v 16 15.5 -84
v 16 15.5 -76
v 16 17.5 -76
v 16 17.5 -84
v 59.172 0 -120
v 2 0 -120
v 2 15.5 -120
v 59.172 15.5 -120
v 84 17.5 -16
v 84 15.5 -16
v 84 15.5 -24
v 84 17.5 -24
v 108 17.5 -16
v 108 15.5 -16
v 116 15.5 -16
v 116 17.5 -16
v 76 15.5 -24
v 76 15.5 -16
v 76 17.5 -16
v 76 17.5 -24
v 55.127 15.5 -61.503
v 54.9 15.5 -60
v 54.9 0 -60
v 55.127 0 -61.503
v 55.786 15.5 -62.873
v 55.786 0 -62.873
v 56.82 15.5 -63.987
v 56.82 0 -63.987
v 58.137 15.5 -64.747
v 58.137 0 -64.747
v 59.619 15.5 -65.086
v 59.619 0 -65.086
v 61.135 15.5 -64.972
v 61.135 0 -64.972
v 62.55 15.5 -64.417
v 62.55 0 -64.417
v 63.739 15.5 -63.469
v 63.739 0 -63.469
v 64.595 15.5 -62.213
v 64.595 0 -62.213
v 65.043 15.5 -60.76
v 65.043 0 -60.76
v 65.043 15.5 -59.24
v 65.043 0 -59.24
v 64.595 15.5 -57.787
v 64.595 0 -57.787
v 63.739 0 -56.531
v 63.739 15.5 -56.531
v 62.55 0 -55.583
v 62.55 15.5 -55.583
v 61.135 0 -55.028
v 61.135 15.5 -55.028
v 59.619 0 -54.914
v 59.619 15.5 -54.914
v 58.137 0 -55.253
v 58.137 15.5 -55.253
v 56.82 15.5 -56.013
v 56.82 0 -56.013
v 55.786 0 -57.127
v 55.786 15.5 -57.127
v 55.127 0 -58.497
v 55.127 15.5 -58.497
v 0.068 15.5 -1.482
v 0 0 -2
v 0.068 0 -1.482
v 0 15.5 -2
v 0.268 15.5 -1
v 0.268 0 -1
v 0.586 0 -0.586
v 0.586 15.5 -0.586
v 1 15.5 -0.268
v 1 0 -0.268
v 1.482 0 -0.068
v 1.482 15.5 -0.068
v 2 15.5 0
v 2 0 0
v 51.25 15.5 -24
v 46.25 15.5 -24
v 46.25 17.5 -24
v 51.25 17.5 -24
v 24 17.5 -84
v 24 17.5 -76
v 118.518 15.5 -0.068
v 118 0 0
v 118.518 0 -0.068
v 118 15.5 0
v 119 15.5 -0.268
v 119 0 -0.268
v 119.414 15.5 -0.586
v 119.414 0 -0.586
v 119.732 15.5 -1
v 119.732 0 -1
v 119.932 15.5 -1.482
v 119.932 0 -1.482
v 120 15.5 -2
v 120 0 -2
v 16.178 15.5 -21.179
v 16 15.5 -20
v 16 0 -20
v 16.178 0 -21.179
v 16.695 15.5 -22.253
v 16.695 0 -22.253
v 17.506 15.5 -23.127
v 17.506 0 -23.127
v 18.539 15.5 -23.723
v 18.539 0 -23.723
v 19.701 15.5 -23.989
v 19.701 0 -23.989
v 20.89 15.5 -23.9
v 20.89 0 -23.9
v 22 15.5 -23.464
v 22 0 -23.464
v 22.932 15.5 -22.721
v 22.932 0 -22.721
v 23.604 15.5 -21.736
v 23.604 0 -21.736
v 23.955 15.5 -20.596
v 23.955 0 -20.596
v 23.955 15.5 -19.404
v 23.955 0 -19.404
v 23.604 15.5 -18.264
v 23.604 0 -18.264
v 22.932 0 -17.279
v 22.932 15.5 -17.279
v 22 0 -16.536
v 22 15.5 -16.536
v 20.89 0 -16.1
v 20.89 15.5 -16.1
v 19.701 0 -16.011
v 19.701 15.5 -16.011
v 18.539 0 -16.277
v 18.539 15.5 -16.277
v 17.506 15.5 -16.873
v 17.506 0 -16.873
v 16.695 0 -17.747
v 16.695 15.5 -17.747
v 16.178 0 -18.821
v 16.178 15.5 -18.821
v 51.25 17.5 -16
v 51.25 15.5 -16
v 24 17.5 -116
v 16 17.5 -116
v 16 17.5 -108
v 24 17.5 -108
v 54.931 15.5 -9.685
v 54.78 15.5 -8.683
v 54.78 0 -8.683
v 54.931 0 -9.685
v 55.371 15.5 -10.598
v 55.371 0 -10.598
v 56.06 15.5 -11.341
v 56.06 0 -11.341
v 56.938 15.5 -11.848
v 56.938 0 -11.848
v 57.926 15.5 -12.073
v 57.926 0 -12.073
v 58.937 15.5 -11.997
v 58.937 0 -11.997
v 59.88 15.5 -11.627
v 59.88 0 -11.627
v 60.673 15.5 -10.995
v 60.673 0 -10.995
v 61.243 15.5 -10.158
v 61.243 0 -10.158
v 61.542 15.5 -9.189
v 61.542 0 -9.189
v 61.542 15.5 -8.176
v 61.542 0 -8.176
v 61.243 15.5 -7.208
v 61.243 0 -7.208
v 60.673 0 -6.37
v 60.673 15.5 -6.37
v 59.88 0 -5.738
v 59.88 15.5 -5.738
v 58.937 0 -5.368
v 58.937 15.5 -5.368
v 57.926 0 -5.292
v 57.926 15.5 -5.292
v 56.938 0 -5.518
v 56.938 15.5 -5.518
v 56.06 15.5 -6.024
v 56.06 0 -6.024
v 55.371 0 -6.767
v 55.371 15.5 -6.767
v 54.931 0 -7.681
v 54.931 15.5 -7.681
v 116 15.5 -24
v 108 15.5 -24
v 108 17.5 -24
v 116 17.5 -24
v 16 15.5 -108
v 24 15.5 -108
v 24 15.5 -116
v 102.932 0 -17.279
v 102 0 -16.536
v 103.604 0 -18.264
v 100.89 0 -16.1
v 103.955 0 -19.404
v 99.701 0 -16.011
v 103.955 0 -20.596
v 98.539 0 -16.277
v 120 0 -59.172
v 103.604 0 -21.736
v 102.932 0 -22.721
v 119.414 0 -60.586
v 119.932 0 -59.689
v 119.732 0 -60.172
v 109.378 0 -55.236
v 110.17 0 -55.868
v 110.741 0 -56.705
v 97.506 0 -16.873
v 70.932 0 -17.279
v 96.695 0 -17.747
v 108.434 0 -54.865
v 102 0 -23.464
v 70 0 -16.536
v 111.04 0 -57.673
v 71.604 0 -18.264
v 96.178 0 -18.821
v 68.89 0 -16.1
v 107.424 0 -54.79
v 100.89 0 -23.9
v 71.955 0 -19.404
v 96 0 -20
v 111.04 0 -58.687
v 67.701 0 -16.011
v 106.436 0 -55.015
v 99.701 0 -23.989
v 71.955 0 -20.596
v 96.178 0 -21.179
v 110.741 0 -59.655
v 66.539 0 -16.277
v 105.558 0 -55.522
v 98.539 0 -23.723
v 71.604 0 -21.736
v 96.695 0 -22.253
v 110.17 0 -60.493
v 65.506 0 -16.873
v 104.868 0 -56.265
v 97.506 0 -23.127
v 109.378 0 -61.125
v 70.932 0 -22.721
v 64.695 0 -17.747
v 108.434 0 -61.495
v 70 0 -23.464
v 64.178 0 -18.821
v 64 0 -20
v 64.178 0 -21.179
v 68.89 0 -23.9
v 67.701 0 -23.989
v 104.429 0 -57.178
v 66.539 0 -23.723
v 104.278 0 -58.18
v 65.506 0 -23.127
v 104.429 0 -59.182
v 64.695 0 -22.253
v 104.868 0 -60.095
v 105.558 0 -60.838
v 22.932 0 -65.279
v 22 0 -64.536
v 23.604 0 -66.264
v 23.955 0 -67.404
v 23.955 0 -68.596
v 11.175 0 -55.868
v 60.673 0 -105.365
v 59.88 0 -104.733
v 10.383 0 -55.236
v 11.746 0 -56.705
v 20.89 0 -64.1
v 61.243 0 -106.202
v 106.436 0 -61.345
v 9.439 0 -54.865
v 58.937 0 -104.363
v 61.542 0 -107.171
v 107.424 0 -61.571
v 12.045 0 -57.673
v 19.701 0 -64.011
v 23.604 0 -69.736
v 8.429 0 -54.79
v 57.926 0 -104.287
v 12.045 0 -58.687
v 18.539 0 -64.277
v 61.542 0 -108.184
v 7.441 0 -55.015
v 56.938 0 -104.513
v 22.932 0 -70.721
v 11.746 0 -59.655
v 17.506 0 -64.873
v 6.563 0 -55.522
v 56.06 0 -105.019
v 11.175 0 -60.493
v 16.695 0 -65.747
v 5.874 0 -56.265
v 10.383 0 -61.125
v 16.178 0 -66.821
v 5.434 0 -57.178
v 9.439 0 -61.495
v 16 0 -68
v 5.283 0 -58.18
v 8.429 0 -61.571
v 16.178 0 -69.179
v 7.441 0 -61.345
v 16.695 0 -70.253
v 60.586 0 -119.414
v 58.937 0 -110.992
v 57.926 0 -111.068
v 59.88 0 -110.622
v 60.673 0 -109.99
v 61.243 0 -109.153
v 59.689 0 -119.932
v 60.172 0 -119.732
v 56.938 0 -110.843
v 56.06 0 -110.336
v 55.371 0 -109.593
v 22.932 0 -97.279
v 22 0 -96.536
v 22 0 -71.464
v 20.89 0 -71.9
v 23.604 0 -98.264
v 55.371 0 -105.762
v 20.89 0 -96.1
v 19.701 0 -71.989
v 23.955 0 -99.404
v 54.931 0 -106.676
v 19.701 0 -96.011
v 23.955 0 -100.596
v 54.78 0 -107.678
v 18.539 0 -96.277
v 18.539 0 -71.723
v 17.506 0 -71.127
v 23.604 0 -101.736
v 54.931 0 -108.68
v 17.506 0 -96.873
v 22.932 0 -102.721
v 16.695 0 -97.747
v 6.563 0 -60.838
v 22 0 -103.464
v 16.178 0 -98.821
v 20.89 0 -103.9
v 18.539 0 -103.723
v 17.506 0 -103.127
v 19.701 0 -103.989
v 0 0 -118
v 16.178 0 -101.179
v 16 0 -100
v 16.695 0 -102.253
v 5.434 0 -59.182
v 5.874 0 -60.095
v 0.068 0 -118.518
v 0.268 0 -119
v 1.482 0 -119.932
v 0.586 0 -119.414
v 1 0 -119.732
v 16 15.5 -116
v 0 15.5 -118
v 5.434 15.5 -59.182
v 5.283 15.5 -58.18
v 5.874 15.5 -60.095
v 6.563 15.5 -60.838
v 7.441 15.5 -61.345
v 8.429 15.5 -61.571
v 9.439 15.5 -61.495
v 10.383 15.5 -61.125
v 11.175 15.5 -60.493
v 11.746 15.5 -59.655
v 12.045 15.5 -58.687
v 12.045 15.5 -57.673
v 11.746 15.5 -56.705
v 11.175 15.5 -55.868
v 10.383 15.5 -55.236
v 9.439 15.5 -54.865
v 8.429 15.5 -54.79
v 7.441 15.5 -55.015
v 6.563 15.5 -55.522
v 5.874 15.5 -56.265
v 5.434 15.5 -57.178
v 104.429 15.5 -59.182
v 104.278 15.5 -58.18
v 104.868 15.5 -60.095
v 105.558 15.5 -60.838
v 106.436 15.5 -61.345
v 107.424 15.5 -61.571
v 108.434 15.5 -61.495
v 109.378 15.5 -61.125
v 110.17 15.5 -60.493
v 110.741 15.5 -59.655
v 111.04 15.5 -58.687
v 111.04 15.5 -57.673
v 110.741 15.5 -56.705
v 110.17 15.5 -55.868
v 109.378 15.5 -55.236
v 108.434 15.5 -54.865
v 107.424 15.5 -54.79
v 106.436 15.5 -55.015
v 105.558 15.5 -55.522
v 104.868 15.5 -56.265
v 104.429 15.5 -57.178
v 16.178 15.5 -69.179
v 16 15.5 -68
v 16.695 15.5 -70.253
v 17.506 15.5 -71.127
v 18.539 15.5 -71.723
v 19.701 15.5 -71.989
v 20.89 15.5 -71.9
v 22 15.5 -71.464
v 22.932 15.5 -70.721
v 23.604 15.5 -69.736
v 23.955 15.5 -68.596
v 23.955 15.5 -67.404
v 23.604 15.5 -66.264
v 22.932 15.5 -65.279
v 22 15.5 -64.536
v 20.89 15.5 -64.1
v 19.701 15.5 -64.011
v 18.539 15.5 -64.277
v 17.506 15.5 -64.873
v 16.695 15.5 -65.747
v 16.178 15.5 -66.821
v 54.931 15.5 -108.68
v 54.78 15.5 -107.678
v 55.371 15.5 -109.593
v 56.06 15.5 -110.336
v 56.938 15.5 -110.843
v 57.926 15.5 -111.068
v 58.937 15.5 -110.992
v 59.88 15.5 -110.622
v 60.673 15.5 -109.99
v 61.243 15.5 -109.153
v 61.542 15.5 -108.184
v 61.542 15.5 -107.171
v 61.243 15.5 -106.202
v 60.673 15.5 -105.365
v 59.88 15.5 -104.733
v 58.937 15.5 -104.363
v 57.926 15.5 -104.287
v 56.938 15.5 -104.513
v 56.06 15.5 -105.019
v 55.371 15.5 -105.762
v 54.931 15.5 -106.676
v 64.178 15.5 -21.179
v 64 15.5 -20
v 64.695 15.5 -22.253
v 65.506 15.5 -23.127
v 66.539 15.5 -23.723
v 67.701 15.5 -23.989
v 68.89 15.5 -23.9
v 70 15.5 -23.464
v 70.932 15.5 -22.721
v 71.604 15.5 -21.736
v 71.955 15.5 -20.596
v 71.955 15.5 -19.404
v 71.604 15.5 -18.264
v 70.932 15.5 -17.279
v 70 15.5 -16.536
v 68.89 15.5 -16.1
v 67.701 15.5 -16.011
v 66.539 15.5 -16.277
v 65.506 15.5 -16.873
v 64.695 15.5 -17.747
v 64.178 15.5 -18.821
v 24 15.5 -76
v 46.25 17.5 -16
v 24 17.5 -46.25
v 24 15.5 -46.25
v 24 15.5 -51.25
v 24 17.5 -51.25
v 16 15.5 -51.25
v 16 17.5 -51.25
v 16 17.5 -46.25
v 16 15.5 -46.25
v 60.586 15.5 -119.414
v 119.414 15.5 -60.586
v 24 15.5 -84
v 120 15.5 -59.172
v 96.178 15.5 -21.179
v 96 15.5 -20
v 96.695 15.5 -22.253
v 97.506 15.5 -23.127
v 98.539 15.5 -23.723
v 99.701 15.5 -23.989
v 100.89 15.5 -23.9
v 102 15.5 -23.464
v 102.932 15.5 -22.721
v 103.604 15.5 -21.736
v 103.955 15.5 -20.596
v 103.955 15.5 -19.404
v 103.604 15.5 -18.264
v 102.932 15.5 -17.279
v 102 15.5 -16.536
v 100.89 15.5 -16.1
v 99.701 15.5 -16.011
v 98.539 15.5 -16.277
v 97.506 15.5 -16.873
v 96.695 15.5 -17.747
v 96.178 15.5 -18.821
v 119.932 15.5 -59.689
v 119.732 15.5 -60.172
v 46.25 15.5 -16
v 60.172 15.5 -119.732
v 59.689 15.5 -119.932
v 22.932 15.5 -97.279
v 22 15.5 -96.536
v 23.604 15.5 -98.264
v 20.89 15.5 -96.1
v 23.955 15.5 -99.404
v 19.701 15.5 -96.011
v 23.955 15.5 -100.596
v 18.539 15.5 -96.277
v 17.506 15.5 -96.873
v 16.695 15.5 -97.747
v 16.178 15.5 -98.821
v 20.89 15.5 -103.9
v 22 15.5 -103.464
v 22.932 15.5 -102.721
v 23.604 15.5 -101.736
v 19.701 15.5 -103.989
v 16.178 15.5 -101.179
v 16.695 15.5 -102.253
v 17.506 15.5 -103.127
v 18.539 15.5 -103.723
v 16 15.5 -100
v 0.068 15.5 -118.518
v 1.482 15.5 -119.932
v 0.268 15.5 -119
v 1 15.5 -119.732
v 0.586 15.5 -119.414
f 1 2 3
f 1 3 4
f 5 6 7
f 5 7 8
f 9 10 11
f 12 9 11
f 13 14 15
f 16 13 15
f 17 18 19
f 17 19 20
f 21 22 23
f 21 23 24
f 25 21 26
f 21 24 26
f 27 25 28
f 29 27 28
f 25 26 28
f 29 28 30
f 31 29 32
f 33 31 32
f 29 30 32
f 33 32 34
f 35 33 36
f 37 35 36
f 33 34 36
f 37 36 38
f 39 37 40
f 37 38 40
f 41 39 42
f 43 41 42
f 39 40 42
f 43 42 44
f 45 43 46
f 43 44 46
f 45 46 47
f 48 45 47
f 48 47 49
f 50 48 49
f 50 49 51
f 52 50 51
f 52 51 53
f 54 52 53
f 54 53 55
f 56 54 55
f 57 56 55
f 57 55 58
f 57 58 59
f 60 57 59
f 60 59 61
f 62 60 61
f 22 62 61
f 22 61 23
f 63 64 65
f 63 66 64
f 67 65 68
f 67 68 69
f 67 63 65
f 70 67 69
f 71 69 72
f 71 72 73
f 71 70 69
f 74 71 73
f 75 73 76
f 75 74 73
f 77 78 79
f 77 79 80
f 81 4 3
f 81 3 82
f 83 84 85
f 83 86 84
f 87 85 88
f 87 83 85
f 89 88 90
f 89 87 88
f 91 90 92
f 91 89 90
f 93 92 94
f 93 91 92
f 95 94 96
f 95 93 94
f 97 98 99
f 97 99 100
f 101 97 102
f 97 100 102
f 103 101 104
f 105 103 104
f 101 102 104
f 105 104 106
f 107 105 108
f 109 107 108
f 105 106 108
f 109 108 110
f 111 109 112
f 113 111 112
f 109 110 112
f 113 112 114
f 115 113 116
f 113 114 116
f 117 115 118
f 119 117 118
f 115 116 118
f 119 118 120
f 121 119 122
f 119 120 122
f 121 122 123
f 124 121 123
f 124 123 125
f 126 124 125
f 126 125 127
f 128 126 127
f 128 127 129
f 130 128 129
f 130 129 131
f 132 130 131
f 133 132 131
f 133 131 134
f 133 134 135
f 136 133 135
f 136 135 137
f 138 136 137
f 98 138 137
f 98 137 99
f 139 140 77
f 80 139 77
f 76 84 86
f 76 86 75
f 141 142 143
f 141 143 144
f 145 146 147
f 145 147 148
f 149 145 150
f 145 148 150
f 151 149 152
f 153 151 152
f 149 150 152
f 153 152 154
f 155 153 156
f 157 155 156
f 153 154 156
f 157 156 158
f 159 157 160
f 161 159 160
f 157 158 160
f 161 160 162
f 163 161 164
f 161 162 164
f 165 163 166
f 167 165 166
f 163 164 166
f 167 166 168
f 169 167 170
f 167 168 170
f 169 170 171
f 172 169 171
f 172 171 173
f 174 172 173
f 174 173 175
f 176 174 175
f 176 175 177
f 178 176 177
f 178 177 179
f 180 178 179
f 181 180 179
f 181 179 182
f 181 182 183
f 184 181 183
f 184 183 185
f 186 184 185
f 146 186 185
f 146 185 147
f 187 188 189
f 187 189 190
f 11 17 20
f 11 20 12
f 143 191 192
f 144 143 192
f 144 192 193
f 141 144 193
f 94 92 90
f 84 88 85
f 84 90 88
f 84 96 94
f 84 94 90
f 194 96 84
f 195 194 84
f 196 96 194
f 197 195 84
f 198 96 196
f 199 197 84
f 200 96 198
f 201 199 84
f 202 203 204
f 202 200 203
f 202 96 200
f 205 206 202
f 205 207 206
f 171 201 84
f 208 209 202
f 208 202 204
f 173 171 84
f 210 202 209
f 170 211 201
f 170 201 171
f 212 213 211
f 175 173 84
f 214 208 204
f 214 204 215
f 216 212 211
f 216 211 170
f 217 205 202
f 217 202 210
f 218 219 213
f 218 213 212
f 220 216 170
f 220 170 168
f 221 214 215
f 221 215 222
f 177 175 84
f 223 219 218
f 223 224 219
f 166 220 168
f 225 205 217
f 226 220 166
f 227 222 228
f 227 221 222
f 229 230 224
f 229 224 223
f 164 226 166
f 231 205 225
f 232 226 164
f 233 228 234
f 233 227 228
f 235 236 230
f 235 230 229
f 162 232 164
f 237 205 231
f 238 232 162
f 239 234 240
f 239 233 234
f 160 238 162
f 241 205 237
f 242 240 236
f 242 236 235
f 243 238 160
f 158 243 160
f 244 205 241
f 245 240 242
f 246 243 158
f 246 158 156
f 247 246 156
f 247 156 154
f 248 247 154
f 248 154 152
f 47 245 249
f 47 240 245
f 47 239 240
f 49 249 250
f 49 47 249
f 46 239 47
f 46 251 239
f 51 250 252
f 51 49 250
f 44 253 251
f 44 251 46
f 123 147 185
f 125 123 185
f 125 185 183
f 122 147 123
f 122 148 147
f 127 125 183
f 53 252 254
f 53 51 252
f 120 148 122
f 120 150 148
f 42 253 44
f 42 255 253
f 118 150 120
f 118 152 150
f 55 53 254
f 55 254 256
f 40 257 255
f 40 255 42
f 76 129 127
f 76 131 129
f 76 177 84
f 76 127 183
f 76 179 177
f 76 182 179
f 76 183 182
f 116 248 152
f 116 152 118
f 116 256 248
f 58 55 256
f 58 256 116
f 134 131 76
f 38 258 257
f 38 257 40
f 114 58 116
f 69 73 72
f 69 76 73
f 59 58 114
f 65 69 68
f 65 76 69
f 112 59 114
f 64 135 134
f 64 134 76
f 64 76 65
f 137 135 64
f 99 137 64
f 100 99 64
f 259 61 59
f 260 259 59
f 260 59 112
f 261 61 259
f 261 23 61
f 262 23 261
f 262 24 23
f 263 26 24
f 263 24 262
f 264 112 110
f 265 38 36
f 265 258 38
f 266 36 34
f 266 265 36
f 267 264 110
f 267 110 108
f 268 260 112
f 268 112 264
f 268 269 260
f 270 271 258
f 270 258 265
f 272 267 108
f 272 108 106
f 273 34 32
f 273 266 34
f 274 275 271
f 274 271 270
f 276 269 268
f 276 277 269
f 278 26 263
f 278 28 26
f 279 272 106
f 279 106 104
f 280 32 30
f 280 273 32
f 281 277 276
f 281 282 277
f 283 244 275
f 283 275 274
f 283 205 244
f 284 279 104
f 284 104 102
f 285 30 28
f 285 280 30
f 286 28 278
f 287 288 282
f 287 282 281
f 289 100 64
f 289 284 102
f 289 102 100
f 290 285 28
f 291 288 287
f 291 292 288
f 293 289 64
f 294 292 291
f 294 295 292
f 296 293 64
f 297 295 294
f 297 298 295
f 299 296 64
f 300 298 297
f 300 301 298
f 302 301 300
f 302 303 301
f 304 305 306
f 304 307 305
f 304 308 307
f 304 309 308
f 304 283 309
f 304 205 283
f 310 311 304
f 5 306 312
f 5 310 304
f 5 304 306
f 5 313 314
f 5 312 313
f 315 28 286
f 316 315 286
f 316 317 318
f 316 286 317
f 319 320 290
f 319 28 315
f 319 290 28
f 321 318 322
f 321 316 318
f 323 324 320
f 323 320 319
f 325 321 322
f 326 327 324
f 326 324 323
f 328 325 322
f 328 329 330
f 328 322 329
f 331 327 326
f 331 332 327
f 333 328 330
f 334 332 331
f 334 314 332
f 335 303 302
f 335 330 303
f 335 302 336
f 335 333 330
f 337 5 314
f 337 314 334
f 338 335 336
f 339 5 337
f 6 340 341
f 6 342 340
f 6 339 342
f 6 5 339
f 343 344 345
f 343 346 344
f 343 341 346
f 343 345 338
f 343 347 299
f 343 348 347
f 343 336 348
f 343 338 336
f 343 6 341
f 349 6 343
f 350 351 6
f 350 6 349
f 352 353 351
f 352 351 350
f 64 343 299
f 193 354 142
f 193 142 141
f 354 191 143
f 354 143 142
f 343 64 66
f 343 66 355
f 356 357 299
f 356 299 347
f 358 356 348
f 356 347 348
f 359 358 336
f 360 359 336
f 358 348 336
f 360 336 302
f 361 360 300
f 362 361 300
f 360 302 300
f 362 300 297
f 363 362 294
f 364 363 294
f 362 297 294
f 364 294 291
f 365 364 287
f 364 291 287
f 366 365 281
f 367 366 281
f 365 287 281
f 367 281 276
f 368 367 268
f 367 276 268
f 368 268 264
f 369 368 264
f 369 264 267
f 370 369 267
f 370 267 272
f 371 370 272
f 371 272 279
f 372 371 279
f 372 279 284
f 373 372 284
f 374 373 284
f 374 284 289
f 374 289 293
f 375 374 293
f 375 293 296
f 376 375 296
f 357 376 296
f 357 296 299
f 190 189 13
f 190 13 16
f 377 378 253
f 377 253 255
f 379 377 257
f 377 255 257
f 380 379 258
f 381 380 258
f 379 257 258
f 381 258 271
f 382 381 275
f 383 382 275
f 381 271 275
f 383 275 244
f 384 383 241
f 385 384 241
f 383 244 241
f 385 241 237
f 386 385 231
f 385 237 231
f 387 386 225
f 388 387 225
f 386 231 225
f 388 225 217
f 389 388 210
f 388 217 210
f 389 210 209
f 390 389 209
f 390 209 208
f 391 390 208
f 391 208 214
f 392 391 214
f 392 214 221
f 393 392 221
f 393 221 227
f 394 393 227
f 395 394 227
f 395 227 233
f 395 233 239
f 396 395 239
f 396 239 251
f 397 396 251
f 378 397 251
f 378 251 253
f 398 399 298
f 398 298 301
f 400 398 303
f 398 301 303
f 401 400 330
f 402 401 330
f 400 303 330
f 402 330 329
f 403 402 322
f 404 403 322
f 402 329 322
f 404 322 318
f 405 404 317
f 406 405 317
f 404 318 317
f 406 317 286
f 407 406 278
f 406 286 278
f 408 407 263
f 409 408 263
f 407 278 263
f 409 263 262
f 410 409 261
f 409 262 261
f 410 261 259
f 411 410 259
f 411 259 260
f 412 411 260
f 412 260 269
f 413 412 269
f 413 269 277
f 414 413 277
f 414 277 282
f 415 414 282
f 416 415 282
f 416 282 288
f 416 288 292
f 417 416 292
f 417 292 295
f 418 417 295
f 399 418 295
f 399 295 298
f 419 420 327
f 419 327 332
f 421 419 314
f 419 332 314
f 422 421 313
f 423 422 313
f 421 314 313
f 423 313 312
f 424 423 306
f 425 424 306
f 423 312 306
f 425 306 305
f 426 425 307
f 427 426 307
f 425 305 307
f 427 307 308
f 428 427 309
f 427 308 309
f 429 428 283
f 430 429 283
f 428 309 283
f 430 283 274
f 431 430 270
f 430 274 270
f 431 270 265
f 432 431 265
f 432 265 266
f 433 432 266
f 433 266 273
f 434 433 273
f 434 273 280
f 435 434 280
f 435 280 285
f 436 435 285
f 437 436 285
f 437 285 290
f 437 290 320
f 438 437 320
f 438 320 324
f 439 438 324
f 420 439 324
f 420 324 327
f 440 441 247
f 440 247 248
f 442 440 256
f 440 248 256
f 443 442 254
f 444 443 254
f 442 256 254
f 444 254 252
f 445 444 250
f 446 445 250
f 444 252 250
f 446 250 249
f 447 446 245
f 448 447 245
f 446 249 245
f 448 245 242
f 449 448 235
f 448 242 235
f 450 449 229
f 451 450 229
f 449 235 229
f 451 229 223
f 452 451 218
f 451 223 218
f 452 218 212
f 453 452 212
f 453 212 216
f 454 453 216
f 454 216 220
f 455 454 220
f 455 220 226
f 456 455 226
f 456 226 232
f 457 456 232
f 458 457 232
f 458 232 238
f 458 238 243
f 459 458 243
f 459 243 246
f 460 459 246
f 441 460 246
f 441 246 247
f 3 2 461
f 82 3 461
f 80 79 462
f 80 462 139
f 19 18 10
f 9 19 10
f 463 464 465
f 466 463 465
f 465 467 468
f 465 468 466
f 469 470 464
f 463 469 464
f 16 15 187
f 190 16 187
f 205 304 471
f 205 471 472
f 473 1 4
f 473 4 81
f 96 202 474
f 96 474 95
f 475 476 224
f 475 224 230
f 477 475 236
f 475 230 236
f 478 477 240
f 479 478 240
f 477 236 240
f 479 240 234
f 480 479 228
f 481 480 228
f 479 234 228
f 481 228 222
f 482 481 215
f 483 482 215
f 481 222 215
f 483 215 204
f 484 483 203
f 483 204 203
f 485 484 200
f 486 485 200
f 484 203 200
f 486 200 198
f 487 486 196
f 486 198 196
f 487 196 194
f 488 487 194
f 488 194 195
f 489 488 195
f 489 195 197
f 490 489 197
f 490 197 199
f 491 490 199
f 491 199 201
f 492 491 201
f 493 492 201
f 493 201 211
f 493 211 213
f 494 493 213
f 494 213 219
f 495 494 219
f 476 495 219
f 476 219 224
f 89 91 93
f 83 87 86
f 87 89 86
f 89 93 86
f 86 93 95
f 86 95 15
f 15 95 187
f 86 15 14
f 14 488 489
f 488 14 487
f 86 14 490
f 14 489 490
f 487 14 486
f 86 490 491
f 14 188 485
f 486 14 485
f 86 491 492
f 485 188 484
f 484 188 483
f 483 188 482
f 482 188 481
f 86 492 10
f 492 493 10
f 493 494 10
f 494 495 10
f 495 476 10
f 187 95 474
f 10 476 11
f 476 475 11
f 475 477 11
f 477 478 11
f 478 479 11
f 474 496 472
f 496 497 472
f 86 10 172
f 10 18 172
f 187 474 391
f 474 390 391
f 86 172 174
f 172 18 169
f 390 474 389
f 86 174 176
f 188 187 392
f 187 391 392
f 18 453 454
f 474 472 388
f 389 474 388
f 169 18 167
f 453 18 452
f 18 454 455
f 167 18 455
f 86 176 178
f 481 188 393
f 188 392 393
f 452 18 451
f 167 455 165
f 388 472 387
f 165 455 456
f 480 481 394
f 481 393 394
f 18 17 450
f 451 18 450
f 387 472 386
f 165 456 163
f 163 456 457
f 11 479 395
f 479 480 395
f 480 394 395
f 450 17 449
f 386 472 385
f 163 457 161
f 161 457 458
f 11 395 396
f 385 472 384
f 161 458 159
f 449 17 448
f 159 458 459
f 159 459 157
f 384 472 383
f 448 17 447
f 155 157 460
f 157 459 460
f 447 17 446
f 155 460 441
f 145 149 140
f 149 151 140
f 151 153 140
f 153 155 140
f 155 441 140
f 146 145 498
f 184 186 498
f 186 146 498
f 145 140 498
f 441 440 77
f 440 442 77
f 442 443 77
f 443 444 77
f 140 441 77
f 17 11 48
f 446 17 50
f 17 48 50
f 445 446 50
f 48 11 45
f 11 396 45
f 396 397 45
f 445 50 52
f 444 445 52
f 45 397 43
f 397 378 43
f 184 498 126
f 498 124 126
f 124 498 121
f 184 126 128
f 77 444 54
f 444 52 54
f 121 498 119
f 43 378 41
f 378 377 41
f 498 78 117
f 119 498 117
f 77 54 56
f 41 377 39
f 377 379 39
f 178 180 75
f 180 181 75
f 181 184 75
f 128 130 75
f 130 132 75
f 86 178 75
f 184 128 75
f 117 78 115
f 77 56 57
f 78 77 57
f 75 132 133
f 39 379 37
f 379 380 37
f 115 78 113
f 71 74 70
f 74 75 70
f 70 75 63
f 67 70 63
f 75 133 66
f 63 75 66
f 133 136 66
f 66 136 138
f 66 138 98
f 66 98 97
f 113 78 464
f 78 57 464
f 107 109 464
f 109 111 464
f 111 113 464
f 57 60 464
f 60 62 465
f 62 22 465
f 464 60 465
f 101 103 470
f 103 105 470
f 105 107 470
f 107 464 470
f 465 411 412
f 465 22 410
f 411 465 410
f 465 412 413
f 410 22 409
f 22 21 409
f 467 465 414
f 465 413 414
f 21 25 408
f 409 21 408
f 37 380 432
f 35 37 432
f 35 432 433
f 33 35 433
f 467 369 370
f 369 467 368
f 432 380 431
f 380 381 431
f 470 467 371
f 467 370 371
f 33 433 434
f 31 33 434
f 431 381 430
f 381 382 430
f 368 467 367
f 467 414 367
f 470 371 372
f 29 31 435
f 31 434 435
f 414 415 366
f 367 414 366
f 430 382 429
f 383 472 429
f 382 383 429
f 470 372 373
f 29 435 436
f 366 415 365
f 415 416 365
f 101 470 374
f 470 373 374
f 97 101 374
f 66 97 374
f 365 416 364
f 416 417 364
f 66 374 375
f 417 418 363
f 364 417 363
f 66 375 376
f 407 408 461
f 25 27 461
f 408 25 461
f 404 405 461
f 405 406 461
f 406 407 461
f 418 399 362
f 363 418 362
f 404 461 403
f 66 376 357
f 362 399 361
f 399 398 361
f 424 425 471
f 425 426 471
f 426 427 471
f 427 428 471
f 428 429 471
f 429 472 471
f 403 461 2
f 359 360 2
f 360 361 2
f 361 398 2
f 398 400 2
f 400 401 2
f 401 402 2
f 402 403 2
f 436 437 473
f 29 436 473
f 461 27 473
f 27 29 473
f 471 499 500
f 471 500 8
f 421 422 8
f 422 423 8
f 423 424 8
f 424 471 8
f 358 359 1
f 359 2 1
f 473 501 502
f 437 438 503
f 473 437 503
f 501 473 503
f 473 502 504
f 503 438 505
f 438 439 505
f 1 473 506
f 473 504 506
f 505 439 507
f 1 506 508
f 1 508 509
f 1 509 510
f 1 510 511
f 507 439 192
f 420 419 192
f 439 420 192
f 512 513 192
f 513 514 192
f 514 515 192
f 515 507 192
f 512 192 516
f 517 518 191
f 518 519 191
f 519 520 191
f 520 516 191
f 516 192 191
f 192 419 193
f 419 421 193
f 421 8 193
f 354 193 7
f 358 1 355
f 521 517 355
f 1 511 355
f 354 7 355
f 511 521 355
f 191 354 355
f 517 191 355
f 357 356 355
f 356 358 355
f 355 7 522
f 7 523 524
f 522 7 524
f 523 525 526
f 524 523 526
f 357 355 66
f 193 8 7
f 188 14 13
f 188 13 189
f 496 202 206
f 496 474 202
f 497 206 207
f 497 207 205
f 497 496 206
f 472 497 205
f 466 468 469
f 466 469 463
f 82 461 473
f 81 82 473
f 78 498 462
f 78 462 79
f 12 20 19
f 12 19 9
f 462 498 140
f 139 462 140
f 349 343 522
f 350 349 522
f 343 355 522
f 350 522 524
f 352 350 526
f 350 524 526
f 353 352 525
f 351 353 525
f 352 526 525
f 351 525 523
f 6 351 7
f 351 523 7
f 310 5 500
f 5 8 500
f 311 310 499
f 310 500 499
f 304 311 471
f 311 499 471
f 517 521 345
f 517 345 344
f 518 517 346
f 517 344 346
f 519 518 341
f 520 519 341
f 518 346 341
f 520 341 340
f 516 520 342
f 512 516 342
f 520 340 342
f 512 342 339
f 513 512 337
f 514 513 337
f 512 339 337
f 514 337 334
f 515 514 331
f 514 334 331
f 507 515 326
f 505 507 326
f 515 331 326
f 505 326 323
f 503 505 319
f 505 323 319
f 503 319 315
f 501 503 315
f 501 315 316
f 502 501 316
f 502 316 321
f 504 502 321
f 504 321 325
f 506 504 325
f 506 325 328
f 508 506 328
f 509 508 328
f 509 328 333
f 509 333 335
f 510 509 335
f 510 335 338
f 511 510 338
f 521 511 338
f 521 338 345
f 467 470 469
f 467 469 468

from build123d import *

# Parameters (mm, degrees)
EXTRUDE_1_DEPTH           = 15.5
HOLE_WIZARD_M121_D        = 10.2
HOLE_WIZARD_M121_DEPTH    = 15.5
HOLE_WIZARD_M82_D         = 6.8
HOLE_WIZARD_M82_DEPTH     = 15.5
HOLE_WIZARD_8_0_8_1_D     = 8
HOLE_WIZARD_8_0_8_1_DEPTH = 15.5
SKETCH_9_W                = 8
SKETCH_9_H                = 8
SKETCH_9_H_2              = 5
SKETCH_9_W_2              = 5
EXTRUDE_2_DEPTH           = 2
FILLET_1_R                = 2


with BuildPart() as part:
    # Эскиз1 → Бобышка-Вытянуть1 (new body)
    with BuildSketch(Plane(origin=(0, 0, 0), x_dir=(1, 0, 0), z_dir=(0, 1, 0))):
        Polygon((0, 0), (0, 120), (60, 120), (120, 60), (120, 0), align=None)
    extrude(amount=EXTRUDE_1_DEPTH)

    # Отверстие обработанное метчиком M121
    with Locations(Plane(origin=(0, 15.5, 0), x_dir=(1, 0, 0), z_dir=(0, 1, 0))):
        with Locations((60, 60)):
            Hole(HOLE_WIZARD_M121_D / 2, depth=HOLE_WIZARD_M121_DEPTH)

    # Отверстие обработанное метчиком M82
    with Locations(Plane(origin=(0, 15.5, 0), x_dir=(1, 0, 0), z_dir=(0, 1, 0))):
        with Locations((58.180194847, 107.67766953), (107.67766953, 58.180194847), (58.180194847, 8.682720164), (8.682720164, 58.180194847)):
            Hole(HOLE_WIZARD_M82_D / 2, depth=HOLE_WIZARD_M82_DEPTH)

    # Диаметр отверстия Ø8.0 (8)1
    with Locations(Plane(origin=(0, 15.5, 0), x_dir=(1, 0, 0), z_dir=(0, 1, 0))):
        with Locations((20, 100), (20, 68), (20, 20), (68, 20), (100, 20)):
            Hole(HOLE_WIZARD_8_0_8_1_D / 2, depth=HOLE_WIZARD_8_0_8_1_DEPTH)

    # Эскиз9 → Бобышка-Вытянуть2 (add)
    with BuildSketch(Plane(origin=(0, 15.5, 0), x_dir=(1, 0, 0), z_dir=(0, 1, 0))):
        with Locations((20, 112)):
            Rectangle(SKETCH_9_W, SKETCH_9_H)
        with Locations((20, 80)):
            Rectangle(SKETCH_9_W, SKETCH_9_H)
        with Locations((20, 48.75)):
            Rectangle(SKETCH_9_W, SKETCH_9_H_2)
        with Locations((48.75, 20)):
            Rectangle(SKETCH_9_W_2, SKETCH_9_H)
        with Locations((80, 20)):
            Rectangle(SKETCH_9_W, SKETCH_9_H)
        with Locations((112, 20)):
            Rectangle(SKETCH_9_W, SKETCH_9_H)
    extrude(amount=EXTRUDE_2_DEPTH)

    # Скругление1
    fillet_1_edges = [part.edges().sort_by_distance(p)[0] for p in [
        (0, 7.75, 0),
        (0, 7.75, -120),
        (60, 7.75, -120),
        (120, 7.75, -60),
        (120, 7.75, 0),
    ]]
    fillet(fillet_1_edges, radius=FILLET_1_R)


solid = part.part
